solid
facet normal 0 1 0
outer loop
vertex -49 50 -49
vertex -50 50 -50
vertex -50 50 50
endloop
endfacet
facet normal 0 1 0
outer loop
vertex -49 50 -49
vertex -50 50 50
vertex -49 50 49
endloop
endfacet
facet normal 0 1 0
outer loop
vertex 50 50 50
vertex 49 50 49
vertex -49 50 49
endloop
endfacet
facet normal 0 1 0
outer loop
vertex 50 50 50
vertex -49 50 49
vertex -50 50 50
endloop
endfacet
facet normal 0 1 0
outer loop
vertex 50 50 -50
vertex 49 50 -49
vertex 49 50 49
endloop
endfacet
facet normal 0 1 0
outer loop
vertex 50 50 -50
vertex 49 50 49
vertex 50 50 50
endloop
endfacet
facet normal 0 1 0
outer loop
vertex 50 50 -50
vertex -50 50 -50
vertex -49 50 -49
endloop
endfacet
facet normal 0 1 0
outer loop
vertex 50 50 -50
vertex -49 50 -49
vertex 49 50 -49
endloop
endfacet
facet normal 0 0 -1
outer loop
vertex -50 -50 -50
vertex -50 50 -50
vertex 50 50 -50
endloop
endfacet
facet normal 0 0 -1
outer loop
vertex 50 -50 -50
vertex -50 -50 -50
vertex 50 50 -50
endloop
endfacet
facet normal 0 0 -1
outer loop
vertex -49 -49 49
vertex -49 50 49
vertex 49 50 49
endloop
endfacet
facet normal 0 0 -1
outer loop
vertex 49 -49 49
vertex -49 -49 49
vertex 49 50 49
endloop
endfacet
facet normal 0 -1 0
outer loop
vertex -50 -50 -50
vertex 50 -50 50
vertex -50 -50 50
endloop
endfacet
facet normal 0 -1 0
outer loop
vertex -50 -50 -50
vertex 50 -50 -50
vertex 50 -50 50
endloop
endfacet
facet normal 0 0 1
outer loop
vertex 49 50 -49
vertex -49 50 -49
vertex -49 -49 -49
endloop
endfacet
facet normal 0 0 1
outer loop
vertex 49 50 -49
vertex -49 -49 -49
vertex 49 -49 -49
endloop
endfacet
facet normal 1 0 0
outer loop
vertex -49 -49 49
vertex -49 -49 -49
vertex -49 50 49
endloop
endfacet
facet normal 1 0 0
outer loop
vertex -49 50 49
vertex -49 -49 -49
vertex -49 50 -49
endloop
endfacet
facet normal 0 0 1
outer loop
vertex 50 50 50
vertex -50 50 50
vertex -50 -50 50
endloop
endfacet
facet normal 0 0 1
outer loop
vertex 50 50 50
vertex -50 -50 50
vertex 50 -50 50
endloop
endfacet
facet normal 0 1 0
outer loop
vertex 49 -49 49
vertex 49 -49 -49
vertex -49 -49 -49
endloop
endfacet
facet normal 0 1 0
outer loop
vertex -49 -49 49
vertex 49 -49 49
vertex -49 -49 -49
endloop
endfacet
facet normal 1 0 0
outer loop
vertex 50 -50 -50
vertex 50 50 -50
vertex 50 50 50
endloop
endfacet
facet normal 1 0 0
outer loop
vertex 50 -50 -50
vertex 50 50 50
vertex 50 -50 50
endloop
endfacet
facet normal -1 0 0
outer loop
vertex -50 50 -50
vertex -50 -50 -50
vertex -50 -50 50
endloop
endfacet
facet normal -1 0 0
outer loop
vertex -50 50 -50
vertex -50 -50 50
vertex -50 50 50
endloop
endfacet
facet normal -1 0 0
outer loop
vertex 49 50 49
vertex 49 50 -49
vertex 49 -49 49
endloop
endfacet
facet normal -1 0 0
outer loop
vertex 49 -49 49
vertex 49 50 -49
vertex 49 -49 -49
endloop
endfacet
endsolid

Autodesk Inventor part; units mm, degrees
ref_plane "YZ Plane" through (0, 0, 0) normal (1, 0, 0) x (0, 1, 0)
ref_plane "XZ Plane" through (0, 0, 0) normal (0, 1, 0) x (-1, 0, 0)
ref_plane "XY Plane" through (0, 0, 0) normal (0, 0, 1) x (1, 0, 0)
sketch "Sketch1" plane through (0, 0, 0) normal (0, 0, 1) x (1, 0, 0)
  line L0 (-50, 50) -> (50, 50)
  line L1 (50, 50) -> (50, -50)
  line L2 (50, -50) -> (-50, -50)
  line L3 (-50, -50) -> (-50, 50)
  line L4 (-50, 50) -> (50, -50) construction
  line L5 (50, 50) -> (-50, -50) construction
  point P0 (0, 0)
  dimension "d0" = 100
  dimension "d1" = 100
extrude "Extrusion1" add sketch "Sketch1" along normal mid plane 100
shell "Shell1" thickness 1 removed faces 1 at (16.6667, 50, -16.6667)
properties part number "test"
